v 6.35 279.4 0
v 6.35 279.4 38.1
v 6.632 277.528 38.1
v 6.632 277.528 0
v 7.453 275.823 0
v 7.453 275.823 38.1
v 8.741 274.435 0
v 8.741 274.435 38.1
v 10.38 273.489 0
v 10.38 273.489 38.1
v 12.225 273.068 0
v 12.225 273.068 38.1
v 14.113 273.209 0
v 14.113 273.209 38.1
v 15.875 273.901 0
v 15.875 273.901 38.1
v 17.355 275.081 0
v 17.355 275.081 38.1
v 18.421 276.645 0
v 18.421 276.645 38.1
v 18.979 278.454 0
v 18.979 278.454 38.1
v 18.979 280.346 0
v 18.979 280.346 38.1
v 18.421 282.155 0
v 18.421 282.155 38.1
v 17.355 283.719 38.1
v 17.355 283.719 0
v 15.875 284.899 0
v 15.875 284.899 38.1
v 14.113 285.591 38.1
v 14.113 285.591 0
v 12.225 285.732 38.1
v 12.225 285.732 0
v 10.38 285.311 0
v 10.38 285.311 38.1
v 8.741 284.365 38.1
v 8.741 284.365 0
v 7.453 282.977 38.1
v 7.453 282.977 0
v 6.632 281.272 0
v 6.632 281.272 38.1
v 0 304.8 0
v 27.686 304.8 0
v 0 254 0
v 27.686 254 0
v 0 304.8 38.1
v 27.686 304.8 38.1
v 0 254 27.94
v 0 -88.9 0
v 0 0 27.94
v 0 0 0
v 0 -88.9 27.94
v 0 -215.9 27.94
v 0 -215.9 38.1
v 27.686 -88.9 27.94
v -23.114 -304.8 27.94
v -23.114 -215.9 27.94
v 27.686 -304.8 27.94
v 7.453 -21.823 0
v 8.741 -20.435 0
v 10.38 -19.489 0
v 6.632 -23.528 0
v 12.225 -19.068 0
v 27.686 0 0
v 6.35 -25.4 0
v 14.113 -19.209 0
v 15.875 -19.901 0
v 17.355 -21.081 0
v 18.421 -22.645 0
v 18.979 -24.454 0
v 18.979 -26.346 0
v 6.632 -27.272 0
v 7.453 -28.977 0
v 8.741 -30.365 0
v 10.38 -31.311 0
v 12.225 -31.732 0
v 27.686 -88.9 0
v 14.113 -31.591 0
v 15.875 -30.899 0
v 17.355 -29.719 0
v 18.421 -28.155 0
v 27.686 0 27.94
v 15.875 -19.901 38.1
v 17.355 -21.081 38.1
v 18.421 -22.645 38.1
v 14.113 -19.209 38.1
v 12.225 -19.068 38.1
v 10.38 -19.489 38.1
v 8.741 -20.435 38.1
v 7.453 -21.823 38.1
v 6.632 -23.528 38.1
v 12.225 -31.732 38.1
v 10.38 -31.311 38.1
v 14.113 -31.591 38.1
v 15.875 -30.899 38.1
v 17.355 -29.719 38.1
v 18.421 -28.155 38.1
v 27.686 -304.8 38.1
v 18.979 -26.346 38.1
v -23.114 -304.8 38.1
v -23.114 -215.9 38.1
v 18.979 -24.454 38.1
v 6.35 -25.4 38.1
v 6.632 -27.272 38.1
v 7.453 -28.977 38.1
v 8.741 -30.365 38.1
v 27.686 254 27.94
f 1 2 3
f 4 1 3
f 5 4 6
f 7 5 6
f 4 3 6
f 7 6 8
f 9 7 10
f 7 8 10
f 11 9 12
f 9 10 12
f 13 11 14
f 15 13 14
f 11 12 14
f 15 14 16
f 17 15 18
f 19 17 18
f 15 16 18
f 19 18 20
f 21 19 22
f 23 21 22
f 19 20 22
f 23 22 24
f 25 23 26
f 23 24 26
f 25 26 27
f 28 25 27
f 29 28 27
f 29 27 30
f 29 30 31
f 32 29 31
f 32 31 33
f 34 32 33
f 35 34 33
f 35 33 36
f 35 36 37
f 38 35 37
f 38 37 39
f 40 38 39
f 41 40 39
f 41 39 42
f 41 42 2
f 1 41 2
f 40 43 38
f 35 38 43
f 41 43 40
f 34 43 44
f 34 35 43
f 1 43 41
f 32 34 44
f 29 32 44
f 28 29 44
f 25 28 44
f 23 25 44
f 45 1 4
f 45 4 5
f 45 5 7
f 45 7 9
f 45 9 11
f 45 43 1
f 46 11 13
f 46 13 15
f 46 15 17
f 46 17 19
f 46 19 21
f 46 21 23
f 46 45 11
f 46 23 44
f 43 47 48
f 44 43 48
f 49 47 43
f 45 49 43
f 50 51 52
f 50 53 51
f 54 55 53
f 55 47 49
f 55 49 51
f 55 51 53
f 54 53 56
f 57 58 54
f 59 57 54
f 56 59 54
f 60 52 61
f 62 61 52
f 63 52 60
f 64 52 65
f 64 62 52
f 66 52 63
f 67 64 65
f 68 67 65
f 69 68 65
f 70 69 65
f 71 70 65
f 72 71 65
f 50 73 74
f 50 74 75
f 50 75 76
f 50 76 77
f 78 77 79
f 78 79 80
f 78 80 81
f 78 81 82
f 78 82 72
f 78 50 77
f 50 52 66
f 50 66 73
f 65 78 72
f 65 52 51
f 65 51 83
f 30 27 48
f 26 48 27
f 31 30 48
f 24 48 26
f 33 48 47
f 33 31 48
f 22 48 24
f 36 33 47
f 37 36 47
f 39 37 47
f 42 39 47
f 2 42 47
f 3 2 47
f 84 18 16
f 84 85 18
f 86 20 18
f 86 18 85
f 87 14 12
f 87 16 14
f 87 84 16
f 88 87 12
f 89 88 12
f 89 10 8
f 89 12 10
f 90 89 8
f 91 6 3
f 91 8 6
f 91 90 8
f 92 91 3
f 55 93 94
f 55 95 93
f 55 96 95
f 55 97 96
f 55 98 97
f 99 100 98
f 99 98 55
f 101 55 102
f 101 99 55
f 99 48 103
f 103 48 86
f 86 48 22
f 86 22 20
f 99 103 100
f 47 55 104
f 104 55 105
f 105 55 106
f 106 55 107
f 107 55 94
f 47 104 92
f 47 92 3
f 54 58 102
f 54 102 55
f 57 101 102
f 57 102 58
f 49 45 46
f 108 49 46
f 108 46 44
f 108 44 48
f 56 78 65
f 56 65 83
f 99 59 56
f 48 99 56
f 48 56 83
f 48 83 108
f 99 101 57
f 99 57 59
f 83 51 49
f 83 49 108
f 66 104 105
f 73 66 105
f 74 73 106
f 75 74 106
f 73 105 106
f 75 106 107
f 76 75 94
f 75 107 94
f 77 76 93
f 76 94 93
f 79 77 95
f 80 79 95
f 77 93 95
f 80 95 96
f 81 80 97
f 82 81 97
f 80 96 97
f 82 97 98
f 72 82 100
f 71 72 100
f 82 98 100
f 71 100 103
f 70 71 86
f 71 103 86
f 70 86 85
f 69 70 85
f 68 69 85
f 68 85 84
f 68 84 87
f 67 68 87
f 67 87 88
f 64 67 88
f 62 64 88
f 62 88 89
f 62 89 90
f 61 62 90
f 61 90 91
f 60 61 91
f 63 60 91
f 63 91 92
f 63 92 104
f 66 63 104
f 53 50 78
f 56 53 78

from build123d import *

# Parameters (mm, degrees)
F1_DEPTH = 304.8
F3_D     = 12.7
F4_W     = 27.686
F4_H     = 215.9
F4_H_2   = 254
F5_DEPTH = 27.94
F6_W     = 23.114
F6_H     = 520.7
F7_DEPTH = 10.161


# Not quite as in the source:
# - a length typed as a fraction of an inch, garbled in the dataset ("3 / 203.2 mm" for 3/8 in), is restored


with BuildPart() as f1:
    # F0 (on Front) → F1 (new body, symmetric)
    with BuildSketch(Plane.XZ):
        Polygon((0, 27.94), (0, 0), (27.686, 0), (27.686, 38.1), (-23.114, 38.1), (-23.114, 27.94), align=None)
    extrude(amount=F1_DEPTH, both=True)

    # F3 (through all)
    with Locations(Plane(origin=(0, 0, 0), x_dir=(1, 0, 0), z_dir=(0, 0, -1))):
        with Locations((12.7, 25.4), (12.7, -279.4)):
            Hole(F3_D / 2)

    # F4 (on face) → F5 (cut, through all)
    with BuildSketch(Plane(origin=(0, 0, 0), x_dir=(1, 0, 0), z_dir=(0, 0, -1))):
        with Locations((13.843, 196.85)):
            Rectangle(F4_W, F4_H)
        with Locations((13.843, -127)):
            Rectangle(F4_W, F4_H_2)
    extrude(amount=-F5_DEPTH, mode=Mode.SUBTRACT)

    # F6 (on face) → F7 (cut, through all)
    with BuildSketch(Plane(origin=(0, 0, 27.94), x_dir=(1, 0, 0), z_dir=(0, 0, -1))):
        with Locations((-11.557, -44.45)):
            Rectangle(F6_W, F6_H)
    extrude(amount=-F7_DEPTH, mode=Mode.SUBTRACT)


solid = f1.part
